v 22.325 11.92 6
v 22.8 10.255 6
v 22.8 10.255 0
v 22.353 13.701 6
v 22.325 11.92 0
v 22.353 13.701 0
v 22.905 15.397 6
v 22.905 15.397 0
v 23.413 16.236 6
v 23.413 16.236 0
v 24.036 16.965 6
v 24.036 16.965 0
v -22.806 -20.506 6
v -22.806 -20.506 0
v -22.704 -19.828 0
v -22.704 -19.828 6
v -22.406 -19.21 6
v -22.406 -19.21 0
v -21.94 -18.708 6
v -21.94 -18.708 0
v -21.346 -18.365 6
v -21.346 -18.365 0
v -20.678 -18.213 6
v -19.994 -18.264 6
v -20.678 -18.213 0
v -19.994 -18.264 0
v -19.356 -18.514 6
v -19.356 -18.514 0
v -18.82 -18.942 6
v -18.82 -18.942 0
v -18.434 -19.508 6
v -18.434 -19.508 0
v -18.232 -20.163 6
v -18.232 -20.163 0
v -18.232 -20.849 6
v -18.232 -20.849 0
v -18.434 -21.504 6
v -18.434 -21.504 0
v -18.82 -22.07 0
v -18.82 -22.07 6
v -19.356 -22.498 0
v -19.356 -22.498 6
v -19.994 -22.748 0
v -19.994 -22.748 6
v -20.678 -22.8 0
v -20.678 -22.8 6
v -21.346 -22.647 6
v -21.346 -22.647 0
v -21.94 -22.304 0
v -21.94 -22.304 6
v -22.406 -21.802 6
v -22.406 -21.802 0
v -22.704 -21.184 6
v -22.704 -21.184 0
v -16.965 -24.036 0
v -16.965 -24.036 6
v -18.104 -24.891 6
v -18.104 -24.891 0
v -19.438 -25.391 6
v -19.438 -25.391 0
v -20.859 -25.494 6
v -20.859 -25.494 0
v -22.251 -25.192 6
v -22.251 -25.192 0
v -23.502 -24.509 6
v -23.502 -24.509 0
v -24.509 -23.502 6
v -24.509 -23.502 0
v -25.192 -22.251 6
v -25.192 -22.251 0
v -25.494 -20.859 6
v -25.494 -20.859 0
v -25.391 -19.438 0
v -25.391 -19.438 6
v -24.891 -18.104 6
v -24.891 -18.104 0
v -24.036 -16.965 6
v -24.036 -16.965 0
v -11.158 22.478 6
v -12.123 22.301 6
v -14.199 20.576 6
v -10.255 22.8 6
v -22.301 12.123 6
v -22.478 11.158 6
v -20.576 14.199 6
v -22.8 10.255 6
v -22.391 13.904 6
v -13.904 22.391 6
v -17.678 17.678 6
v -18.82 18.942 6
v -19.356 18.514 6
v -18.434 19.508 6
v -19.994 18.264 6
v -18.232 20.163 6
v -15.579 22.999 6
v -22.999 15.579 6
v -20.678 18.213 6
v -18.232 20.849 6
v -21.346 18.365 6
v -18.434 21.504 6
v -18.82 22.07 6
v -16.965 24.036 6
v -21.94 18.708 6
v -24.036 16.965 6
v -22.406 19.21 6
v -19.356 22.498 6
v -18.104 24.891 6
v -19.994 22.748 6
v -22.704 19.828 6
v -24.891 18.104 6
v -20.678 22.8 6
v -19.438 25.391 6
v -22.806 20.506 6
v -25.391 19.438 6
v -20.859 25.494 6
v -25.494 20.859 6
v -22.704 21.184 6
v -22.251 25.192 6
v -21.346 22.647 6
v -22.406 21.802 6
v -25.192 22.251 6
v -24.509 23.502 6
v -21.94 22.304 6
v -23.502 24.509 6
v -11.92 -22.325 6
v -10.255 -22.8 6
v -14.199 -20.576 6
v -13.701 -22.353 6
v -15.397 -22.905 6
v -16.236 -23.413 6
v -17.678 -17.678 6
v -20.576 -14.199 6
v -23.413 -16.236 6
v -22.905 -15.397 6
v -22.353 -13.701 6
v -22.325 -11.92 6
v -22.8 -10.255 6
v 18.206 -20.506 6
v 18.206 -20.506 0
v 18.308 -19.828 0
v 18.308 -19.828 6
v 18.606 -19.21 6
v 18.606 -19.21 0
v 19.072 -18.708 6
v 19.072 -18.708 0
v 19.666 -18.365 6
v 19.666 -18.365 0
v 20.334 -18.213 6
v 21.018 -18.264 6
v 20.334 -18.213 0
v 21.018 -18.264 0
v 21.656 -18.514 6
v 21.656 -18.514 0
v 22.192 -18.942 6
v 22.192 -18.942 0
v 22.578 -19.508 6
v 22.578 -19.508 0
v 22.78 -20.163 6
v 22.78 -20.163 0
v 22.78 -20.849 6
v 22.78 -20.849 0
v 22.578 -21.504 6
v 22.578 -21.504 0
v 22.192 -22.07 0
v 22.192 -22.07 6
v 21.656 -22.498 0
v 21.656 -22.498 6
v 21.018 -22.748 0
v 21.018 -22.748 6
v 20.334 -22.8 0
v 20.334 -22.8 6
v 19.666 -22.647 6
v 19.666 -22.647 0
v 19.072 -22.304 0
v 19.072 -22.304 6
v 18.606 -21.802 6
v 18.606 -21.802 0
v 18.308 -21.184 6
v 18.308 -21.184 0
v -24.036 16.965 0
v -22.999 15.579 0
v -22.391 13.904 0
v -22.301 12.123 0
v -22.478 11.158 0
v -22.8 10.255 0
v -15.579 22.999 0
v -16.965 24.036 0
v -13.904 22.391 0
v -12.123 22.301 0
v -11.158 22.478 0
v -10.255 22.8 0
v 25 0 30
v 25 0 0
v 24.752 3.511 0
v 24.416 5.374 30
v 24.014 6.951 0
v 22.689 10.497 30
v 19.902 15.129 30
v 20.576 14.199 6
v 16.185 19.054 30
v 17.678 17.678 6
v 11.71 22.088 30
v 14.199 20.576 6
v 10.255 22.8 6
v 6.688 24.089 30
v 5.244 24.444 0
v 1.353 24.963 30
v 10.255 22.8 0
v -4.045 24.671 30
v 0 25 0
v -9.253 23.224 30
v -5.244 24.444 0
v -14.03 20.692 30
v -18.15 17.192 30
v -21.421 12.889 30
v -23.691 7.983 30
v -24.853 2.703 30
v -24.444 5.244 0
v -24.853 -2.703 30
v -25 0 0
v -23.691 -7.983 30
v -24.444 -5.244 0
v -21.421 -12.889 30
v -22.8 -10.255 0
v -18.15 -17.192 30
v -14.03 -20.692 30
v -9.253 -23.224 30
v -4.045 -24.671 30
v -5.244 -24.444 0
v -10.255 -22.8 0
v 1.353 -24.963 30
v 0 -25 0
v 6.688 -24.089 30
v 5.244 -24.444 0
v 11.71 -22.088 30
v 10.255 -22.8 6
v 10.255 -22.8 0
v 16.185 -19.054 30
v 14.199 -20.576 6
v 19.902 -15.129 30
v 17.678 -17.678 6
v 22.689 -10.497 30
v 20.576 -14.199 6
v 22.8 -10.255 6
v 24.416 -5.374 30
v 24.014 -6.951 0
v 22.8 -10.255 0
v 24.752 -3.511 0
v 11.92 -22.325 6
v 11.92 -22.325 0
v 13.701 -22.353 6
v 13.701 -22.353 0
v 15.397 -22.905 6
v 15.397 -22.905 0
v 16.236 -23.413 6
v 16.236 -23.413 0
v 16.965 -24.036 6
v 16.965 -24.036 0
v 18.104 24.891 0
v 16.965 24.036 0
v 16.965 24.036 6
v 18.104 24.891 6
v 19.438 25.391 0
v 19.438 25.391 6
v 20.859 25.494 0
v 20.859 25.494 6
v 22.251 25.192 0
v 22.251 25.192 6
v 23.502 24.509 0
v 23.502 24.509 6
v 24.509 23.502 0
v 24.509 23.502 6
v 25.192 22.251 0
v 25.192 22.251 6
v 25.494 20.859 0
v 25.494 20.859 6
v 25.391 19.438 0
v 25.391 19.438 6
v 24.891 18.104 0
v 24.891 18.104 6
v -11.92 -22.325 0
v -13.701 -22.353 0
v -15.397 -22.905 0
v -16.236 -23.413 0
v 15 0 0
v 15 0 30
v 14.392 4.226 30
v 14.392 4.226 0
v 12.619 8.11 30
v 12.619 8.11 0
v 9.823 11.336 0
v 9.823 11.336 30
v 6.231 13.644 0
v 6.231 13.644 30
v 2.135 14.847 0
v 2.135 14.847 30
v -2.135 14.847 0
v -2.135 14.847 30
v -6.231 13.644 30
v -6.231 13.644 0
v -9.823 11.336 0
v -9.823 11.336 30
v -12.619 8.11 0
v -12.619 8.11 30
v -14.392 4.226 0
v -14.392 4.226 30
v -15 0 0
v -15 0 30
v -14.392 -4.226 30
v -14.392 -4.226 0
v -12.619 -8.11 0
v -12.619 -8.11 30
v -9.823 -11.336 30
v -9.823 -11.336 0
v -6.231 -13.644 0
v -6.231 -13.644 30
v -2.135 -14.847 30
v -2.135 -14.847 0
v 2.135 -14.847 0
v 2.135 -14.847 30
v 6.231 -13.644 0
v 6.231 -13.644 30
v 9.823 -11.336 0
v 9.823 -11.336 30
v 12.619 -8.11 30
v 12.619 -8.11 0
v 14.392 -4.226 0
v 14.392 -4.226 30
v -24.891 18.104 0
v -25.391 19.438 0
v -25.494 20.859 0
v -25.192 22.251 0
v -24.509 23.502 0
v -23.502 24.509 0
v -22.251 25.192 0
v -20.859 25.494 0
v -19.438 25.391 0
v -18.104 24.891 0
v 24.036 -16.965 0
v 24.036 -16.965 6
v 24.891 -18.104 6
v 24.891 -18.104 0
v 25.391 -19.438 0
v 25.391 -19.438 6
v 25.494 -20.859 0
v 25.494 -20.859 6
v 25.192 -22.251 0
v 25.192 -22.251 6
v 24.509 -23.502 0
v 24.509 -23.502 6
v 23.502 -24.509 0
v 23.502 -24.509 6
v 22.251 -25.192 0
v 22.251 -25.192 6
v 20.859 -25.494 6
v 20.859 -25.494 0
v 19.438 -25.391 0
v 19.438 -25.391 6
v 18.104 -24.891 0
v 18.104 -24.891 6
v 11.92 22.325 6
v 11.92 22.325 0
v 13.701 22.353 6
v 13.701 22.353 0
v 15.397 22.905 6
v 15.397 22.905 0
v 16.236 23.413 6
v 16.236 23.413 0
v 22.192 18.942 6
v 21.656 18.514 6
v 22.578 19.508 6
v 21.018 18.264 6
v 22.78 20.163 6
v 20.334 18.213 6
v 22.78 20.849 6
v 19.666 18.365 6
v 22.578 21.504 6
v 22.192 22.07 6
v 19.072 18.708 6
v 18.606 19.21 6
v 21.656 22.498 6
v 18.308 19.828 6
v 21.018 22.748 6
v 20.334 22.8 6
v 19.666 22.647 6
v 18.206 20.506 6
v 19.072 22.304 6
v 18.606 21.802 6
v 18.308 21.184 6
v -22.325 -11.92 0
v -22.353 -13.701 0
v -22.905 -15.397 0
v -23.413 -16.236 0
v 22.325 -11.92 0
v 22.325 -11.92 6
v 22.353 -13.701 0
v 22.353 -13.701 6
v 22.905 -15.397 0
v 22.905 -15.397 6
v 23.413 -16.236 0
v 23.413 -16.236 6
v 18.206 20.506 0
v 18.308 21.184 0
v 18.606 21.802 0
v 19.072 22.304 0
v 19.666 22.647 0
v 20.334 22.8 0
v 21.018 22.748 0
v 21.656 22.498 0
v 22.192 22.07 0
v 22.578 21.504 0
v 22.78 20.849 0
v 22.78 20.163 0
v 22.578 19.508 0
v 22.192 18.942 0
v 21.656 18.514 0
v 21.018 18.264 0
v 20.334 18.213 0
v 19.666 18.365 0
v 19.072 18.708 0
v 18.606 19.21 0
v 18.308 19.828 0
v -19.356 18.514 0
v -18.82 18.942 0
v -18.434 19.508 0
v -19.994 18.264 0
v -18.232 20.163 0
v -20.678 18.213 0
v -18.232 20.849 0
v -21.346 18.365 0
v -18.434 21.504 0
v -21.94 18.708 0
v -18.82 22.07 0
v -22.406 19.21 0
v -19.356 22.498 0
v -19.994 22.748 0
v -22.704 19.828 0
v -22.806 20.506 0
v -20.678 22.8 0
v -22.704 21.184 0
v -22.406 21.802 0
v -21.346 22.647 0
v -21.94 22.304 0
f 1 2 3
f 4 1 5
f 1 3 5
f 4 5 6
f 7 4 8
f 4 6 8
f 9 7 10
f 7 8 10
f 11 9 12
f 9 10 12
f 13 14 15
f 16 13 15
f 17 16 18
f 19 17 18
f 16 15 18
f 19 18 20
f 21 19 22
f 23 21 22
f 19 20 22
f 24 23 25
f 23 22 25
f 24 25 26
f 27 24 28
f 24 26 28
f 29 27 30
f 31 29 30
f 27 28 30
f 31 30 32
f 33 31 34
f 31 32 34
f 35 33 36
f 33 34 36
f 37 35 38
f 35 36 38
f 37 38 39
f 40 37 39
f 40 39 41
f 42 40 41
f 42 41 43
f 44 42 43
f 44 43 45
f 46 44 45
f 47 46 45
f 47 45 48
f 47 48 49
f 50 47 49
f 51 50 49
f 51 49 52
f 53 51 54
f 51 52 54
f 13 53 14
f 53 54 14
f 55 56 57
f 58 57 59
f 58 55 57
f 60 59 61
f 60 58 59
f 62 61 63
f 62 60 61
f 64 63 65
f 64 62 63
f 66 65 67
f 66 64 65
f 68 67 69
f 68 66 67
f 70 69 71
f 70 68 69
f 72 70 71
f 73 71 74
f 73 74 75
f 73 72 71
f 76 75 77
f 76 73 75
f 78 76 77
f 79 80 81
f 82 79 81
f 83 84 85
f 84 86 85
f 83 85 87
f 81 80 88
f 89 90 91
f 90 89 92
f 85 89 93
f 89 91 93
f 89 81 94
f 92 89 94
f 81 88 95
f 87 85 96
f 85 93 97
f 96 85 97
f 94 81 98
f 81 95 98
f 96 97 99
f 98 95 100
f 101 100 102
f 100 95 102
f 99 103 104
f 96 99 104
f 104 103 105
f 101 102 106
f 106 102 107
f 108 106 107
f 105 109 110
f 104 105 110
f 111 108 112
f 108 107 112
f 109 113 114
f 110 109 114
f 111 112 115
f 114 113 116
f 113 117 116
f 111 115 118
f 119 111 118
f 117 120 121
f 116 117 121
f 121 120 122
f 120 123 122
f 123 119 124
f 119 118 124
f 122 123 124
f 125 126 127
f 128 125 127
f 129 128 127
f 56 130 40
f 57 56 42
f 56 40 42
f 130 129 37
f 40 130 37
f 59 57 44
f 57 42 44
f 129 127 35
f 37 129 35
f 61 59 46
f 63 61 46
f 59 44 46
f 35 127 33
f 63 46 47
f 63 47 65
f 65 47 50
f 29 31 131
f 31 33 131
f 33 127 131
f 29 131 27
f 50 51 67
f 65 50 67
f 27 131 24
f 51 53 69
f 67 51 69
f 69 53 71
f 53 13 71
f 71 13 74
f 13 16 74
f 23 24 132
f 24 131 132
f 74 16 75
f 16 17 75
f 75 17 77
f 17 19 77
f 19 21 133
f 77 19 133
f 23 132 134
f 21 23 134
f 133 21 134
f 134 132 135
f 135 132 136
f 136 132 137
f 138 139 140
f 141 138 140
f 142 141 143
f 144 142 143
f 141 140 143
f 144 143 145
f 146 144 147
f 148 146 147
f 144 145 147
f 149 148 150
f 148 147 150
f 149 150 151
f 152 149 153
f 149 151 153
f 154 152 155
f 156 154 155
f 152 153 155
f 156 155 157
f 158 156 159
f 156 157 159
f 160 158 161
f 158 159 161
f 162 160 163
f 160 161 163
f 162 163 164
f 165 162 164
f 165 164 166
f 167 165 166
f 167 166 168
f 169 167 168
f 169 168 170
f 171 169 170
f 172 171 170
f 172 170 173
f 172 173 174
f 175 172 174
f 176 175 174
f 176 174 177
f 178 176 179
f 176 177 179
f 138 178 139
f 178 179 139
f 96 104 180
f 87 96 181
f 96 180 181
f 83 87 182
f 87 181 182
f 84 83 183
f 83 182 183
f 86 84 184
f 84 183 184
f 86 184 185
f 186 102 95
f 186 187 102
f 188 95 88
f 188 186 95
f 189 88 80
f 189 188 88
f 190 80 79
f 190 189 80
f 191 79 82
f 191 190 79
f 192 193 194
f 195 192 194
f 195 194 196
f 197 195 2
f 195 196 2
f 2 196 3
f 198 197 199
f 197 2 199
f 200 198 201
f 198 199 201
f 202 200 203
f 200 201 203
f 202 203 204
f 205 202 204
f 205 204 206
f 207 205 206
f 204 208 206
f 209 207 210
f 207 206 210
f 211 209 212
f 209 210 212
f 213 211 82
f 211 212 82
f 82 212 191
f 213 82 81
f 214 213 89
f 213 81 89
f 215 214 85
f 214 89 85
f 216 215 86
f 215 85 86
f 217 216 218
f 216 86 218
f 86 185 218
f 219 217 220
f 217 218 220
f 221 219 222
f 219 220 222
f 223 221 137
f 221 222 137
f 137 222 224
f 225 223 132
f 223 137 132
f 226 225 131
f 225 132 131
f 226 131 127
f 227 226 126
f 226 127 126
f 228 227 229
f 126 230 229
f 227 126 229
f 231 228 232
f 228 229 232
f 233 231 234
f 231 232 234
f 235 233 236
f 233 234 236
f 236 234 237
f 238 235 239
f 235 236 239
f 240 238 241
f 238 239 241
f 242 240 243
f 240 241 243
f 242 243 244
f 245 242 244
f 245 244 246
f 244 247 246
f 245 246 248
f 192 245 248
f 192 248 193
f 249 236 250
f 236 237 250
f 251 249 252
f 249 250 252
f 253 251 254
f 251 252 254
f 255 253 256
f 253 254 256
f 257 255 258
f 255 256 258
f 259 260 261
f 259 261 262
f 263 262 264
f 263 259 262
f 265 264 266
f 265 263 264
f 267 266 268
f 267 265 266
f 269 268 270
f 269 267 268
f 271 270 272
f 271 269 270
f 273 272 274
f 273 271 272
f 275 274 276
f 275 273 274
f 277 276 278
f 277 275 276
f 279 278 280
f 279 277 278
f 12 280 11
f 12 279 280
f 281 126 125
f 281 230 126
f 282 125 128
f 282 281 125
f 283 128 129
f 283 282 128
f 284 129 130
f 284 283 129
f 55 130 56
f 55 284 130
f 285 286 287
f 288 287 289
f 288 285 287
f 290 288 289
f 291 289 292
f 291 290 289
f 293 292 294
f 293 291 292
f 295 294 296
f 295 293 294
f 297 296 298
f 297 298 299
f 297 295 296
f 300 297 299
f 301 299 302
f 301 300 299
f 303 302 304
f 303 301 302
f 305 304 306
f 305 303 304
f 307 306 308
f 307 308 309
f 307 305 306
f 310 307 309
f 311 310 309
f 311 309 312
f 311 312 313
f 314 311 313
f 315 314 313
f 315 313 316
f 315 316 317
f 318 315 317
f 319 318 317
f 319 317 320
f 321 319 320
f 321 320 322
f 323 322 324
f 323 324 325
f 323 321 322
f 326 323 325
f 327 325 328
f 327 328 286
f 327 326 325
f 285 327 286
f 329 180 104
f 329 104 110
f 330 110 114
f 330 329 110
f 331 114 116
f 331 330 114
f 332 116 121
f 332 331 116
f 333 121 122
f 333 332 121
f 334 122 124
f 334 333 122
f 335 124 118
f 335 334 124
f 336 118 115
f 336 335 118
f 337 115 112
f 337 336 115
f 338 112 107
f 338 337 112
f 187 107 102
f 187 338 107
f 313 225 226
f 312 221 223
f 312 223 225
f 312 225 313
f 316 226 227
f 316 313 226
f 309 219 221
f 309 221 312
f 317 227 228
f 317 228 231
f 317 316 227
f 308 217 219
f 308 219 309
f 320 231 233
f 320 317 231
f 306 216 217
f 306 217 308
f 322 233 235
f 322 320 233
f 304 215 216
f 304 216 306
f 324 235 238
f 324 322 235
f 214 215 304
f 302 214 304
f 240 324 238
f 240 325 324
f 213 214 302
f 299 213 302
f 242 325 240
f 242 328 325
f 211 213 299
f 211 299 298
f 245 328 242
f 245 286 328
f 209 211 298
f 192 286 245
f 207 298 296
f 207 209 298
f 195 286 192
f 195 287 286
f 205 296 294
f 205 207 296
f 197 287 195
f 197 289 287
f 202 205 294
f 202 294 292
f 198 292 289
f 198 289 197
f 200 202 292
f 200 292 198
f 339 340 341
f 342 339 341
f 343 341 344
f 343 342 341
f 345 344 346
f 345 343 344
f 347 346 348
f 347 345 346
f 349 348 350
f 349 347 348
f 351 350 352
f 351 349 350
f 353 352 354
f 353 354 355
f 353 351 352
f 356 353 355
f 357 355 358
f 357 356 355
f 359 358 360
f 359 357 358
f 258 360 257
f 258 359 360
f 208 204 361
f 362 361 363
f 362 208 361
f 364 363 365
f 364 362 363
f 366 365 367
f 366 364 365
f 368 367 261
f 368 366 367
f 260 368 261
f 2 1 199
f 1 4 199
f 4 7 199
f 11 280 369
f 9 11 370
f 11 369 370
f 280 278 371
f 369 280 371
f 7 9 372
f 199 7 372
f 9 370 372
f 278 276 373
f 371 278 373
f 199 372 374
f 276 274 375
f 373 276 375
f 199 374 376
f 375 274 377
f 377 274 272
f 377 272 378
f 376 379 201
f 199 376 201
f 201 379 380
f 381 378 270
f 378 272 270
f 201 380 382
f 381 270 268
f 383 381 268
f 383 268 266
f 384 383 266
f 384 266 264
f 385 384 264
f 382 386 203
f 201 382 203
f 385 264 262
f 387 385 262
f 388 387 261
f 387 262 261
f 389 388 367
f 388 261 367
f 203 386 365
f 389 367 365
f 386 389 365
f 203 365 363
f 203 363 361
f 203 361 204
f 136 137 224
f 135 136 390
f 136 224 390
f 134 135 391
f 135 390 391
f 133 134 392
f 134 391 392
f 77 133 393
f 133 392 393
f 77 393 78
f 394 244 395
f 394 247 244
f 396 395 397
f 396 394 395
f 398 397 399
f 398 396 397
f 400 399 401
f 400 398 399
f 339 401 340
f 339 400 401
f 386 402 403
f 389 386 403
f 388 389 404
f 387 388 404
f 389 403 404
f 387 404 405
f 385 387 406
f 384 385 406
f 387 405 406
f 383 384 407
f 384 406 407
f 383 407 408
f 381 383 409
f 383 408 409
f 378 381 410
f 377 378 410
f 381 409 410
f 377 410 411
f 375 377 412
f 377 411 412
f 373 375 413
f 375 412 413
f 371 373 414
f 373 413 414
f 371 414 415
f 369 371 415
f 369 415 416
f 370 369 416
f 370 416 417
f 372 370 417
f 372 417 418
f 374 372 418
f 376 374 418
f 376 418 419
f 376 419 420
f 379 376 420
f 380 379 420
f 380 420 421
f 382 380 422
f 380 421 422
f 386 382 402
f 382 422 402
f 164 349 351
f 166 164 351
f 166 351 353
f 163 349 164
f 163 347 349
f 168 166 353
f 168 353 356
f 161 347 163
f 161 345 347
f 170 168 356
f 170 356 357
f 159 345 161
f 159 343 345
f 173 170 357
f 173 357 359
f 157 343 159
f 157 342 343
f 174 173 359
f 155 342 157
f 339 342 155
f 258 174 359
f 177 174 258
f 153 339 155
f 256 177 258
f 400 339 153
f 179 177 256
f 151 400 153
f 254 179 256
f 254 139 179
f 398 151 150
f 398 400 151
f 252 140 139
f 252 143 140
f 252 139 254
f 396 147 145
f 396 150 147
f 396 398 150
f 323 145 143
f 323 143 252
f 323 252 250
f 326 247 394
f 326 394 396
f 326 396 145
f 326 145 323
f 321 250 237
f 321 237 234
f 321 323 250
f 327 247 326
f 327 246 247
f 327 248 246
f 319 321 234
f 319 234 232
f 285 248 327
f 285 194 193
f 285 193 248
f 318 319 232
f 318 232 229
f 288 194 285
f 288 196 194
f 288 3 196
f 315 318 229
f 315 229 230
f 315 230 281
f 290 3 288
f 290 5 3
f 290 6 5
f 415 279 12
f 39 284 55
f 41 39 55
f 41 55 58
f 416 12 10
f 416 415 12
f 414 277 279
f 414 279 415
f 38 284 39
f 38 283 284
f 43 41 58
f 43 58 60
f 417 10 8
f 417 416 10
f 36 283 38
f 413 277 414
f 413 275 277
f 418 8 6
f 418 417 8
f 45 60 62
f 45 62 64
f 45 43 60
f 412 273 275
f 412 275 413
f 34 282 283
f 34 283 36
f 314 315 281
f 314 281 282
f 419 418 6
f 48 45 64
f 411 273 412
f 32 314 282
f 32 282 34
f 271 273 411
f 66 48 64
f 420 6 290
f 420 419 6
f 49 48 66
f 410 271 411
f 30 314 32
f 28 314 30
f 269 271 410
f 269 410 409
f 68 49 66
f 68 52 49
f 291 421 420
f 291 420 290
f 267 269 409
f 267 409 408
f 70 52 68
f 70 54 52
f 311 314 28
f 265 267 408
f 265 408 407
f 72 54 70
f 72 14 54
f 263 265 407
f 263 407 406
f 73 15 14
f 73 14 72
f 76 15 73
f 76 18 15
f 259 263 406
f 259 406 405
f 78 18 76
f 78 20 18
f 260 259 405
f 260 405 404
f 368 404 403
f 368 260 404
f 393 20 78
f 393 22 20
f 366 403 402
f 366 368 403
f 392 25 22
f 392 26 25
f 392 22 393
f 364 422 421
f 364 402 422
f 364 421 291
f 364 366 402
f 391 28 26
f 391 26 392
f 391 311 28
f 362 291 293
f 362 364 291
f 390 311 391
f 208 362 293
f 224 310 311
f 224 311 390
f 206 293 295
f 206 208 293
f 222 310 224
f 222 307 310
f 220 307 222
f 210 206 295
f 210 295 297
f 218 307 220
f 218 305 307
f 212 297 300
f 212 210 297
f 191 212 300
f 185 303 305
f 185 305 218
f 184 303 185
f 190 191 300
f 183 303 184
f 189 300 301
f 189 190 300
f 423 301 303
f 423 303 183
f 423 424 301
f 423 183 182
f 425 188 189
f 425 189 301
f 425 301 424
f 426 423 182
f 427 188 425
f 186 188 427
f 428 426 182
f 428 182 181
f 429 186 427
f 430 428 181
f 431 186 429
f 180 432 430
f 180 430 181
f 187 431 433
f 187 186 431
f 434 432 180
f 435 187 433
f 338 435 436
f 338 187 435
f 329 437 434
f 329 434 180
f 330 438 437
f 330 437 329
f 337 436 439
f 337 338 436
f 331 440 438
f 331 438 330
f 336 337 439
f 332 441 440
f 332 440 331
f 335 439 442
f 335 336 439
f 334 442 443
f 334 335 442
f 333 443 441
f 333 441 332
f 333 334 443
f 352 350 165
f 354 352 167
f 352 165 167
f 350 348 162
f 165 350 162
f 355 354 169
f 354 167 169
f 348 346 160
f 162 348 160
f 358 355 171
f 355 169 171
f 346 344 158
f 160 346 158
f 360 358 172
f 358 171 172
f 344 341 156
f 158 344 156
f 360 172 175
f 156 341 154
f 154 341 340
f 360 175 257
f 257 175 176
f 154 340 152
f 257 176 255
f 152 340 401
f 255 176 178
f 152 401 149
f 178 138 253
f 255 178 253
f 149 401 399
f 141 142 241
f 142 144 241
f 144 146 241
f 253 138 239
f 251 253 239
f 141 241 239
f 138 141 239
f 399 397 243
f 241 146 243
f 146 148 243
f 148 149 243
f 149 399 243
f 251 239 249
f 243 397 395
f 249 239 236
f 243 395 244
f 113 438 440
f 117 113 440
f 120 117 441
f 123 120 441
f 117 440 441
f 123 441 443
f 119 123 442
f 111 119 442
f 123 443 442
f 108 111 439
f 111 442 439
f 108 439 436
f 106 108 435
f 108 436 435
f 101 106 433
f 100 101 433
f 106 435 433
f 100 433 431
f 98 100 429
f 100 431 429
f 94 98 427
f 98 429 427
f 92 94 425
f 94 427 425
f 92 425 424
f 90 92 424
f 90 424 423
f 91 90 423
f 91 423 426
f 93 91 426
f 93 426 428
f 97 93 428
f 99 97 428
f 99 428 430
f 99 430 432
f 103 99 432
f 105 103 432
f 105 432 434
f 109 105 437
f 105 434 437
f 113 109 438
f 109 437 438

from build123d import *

# Parameters (mm, degrees)
SKETCH1_R           = 25
SKETCH1_R_2         = 15
BOSS_EXTRUDE1_DEPTH = 30
SKETCH2_R           = 5
SKETCH2_R_2         = 2.3
BOSS_EXTRUDE2_DEPTH = 6
FILLET1_R           = 6


with BuildPart() as part:
    # Sketch1 → Boss-Extrude1 (new body)
    with BuildSketch(Plane.XY):
        Circle(SKETCH1_R)
        Circle(SKETCH1_R_2, mode=Mode.SUBTRACT)
    extrude(amount=BOSS_EXTRUDE1_DEPTH)

    # Sketch2 → Boss-Extrude2 (add)
    # profile 1 of 4: a face of its own
    with BuildSketch(Plane(origin=(0, 0, 0), x_dir=(-1, 0, 0), z_dir=(0, 0, -1))):
        with Locations((20.506096654, 20.506096654)):
            Circle(SKETCH2_R)
        with Locations((20.506096654, 20.506096654)):
            Circle(SKETCH2_R_2, mode=Mode.SUBTRACT)
    # profile 2 of 4: a face of its own
    with BuildSketch(Plane(origin=(0, 0, 0), x_dir=(-1, 0, 0), z_dir=(0, 0, -1))):
        with Locations((20.506096654, -20.506096654)):
            Circle(SKETCH2_R)
        with Locations((20.506096654, -20.506096654)):
            Circle(SKETCH2_R_2, mode=Mode.SUBTRACT)
    # profile 3 of 4: a face of its own
    with BuildSketch(Plane(origin=(0, 0, 0), x_dir=(-1, 0, 0), z_dir=(0, 0, -1))):
        with Locations((-20.506096654, -20.506096654)):
            Circle(SKETCH2_R)
        with Locations((-20.506096654, -20.506096654)):
            Circle(SKETCH2_R_2, mode=Mode.SUBTRACT)
    # profile 4 of 4: a face of its own
    with BuildSketch(Plane(origin=(0, 0, 0), x_dir=(-1, 0, 0), z_dir=(0, 0, -1))):
        with Locations((-20.506096654, 20.506096654)):
            Circle(SKETCH2_R)
        with Locations((-20.506096654, 20.506096654)):
            Circle(SKETCH2_R_2, mode=Mode.SUBTRACT)
    extrude(amount=-BOSS_EXTRUDE2_DEPTH)

    # Fillet1
    fillet1_edges = [part.edges().sort_by_distance(p)[0] for p in [
        (-19.534483911, 15.601408216, 3),
        (-15.601408216, 19.534483911, 3),
        (-15.601408216, -19.534483911, 3),
        (-19.534483911, -15.601408216, 3),
        (19.534483911, -15.601408216, 3),
        (15.601408216, -19.534483911, 3),
        (15.601408216, 19.534483911, 3),
        (19.534483911, 15.601408216, 3),
    ]]
    fillet(fillet1_edges, radius=FILLET1_R)


solid = part.part
